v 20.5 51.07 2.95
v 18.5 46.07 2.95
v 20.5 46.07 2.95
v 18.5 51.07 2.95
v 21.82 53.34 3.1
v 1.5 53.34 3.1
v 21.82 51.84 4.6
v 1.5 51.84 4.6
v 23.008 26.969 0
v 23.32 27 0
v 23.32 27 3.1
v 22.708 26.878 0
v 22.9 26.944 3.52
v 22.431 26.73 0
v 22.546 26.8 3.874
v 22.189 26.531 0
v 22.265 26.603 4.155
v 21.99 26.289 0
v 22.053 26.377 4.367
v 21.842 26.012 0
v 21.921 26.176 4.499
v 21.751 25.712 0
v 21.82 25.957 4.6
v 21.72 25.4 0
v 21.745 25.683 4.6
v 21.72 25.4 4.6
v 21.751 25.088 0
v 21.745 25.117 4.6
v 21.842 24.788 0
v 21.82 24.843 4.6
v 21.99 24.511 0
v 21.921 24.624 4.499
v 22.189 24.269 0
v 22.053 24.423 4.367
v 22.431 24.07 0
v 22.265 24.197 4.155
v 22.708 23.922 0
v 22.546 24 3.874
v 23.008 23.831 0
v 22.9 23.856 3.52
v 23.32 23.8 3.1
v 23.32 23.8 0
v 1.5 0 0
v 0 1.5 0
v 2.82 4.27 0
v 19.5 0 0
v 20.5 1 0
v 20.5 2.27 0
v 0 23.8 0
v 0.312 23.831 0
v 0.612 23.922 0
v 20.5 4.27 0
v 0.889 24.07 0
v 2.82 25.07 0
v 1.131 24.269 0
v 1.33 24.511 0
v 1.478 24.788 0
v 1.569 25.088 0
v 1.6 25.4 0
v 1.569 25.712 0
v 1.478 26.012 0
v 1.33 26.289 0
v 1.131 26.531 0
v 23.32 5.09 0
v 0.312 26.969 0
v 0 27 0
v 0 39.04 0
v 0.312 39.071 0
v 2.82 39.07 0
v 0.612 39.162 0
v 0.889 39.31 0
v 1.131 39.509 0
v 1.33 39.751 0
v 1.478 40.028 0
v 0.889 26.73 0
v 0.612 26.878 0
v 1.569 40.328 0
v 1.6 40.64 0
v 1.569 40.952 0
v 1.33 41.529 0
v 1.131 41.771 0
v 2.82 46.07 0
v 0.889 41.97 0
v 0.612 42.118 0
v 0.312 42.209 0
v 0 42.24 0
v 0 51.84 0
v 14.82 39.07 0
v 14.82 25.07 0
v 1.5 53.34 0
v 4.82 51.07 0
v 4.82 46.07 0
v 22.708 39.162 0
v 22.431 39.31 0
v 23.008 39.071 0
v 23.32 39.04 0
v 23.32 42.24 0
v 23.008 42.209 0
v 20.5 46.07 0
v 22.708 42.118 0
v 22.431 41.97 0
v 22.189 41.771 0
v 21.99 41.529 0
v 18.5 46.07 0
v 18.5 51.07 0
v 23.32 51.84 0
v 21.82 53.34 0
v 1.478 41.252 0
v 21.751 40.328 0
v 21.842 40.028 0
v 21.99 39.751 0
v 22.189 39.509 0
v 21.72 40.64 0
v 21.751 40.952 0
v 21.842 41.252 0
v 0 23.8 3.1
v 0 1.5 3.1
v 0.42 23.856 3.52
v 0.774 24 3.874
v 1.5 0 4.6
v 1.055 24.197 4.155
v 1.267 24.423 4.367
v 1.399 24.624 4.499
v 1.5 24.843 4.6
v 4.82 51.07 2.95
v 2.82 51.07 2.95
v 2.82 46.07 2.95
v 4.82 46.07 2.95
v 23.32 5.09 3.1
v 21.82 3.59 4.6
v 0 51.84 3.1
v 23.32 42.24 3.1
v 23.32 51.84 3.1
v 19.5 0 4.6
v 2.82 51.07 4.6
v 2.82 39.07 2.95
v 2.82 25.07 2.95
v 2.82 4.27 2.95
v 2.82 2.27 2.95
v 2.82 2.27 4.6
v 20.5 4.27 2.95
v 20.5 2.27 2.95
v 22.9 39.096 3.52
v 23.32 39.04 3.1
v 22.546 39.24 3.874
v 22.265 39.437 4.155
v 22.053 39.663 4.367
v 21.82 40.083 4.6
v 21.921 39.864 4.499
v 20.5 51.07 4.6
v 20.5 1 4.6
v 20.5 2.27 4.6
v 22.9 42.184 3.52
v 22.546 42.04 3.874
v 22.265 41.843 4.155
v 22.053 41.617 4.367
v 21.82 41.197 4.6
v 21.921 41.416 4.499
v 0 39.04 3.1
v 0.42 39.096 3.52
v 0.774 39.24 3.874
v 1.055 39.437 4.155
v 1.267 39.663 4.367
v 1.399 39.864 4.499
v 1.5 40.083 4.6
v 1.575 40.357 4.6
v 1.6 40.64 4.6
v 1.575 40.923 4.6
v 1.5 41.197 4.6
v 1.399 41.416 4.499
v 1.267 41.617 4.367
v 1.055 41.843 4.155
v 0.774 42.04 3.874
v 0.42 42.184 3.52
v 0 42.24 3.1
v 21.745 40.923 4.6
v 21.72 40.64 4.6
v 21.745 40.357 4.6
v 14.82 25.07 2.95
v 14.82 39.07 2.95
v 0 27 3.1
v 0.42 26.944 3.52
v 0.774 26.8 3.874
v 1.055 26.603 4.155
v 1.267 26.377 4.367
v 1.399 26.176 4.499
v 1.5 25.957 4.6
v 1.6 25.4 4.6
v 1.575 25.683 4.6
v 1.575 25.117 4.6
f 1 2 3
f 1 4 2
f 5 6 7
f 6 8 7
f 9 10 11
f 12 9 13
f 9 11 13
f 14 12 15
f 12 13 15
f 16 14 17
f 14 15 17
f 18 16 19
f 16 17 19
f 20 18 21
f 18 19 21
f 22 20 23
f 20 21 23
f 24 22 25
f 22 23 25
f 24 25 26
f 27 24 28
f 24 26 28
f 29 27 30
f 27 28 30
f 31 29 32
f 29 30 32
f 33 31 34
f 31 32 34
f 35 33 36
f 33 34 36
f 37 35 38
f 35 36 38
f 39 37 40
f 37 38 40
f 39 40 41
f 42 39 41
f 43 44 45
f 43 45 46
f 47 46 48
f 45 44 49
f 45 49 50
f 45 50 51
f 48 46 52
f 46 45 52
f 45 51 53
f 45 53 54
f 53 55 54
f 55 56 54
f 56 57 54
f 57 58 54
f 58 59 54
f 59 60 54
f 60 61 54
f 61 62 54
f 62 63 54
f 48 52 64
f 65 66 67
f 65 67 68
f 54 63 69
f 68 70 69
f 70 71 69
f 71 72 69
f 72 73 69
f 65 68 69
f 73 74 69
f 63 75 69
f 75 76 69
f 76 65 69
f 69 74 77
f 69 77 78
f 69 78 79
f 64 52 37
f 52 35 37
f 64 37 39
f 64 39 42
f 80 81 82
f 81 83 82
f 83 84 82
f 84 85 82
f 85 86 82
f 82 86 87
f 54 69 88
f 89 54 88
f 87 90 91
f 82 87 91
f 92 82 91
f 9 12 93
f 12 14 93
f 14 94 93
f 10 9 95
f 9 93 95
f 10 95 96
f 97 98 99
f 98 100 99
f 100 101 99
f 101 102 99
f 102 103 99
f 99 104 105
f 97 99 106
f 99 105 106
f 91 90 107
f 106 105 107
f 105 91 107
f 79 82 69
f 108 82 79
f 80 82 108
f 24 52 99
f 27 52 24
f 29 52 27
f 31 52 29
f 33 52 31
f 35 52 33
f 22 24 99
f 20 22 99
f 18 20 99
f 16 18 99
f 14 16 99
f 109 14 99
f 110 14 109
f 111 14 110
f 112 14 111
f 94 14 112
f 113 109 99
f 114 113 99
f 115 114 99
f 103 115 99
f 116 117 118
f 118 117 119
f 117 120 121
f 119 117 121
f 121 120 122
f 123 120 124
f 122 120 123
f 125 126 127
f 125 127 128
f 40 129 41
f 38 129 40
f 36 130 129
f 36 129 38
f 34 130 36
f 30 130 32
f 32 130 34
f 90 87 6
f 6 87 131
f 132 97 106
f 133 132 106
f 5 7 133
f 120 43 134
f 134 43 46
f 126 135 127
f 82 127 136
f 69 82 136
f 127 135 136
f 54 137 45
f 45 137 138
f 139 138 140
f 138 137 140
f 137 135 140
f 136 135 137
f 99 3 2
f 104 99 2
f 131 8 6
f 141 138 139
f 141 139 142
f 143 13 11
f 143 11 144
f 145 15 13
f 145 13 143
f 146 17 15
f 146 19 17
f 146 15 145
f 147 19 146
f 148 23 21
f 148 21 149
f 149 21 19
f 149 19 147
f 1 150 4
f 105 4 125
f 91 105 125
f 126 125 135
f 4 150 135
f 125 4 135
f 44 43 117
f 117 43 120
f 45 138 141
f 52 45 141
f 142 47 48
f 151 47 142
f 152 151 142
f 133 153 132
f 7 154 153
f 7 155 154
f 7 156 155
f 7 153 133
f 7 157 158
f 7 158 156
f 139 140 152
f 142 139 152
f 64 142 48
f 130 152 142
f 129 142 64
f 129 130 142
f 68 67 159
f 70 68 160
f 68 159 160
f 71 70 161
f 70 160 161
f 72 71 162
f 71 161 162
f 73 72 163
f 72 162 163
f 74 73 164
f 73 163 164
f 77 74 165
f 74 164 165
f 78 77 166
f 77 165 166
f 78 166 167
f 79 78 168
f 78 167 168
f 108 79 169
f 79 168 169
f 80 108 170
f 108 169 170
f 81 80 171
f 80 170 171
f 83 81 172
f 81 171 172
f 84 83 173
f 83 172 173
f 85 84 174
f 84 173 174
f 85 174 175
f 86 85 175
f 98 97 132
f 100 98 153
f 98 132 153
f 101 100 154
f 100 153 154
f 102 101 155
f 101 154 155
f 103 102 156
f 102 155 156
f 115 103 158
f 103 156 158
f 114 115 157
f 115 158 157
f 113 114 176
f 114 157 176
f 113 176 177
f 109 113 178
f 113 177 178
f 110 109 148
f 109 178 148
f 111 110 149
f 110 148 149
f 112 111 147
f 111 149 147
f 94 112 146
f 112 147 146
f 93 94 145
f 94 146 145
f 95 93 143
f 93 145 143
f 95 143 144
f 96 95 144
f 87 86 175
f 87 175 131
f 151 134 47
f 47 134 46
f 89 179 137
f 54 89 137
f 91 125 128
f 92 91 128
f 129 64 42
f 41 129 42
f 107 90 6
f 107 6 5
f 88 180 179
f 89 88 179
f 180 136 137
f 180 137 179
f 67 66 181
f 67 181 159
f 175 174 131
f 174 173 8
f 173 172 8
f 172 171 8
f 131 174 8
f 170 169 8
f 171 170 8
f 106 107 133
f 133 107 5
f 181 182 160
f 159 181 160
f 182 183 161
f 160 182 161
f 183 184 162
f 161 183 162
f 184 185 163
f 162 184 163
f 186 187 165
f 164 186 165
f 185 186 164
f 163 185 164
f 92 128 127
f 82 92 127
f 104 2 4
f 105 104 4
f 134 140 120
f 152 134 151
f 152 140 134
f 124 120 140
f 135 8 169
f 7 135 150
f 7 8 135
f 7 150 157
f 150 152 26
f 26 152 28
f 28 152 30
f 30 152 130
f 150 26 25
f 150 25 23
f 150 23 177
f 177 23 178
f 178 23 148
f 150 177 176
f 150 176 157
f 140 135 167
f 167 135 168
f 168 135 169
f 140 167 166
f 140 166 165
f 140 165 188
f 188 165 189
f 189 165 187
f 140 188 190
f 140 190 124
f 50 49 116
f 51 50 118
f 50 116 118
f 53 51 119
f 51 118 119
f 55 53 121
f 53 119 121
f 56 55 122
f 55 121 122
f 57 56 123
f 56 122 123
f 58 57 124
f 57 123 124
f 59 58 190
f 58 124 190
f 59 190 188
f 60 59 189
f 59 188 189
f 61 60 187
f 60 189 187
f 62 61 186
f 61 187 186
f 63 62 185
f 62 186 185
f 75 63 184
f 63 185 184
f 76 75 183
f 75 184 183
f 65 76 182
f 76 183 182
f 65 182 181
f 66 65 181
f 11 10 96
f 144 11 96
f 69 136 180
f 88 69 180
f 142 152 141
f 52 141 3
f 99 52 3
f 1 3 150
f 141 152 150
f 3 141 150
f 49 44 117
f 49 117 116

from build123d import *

# Parameters (mm, degrees)
SKETCH_W        = 23.32
SKETCH_H        = 53.34
PAD_DEPTH       = 4.6
SKETCH001_W     = 17.68
SKETCH001_H     = 48.8
POCKET_DEPTH    = 1.65
POCKET001_DEPTH = 3
SKETCH003_R     = 1.6
POCKET002_DEPTH = 5
CHAMFER_SIZE    = 1.5
POCKET003_DEPTH = 5
CHAMFER001_SIZE = 1


with BuildPart() as part:
    # Sketch → Pad (new body)
    with BuildSketch(Plane.XY):
        with Locations((11.66, 26.67)):
            Rectangle(SKETCH_W, SKETCH_H)
    extrude(amount=PAD_DEPTH)

    # Sketch001 (on Face6 of Pad) → Pocket (cut)
    with BuildSketch(Plane.XY.offset(4.6)):
        with Locations((11.66, 26.67)):
            Rectangle(SKETCH001_W, SKETCH001_H)
    extrude(amount=-POCKET_DEPTH, mode=Mode.SUBTRACT)

    # Sketch002 (on Face11 of Pocket) → Pocket001 (cut)
    with BuildSketch(Plane.XY.offset(2.95)):
        Polygon((2.82, 4.27), (20.5, 4.27), (20.5, 46.07), (18.5, 46.07), (18.5, 51.07), (4.82, 51.07), (4.82, 46.07), (2.82, 46.07), (2.82, 39.07), (14.82, 39.07), (14.82, 25.07), (2.82, 25.07), align=None)
    extrude(amount=-POCKET001_DEPTH, mode=Mode.SUBTRACT)

    # Sketch003 (on Face5 of Pocket001) → Pocket002 (cut)
    with BuildSketch(Plane.XY.offset(4.6)):
        with Locations((23.32, 40.64)):
            Circle(SKETCH003_R)
        with Locations((23.32, 25.4)):
            Circle(SKETCH003_R)
        with Locations((0, 40.64)):
            Circle(SKETCH003_R)
        with Locations((0, 25.4)):
            Circle(SKETCH003_R)
    extrude(amount=-POCKET002_DEPTH, mode=Mode.SUBTRACT)

    # Chamfer
    chamfer_edges = [part.edges().sort_by_distance(p)[0] for p in [
        (23.32, 47.79, 4.6),
        (11.66, 53.34, 4.6),
        (0, 47.79, 4.6),
        (0, 33.02, 4.6),
        (23.32, 33.02, 4.6),
        (23.32, 11.9, 4.6),
        (0, 11.9, 4.6),
        (23.32, 0, 2.3),
        (0, 0, 2.3),
        (23.32, 53.34, 2.3),
        (0, 53.34, 2.3),
    ]]
    chamfer(chamfer_edges, length=CHAMFER_SIZE)

    # Sketch004 (on Face35 of Chamfer) → Pocket003 (cut)
    with BuildSketch(Plane.XY.offset(4.6)):
        Polygon((24.23, 6), (24.23, 0), (20.5, 0), (20.5, 2.27), align=None)
    extrude(amount=-POCKET003_DEPTH, mode=Mode.SUBTRACT)

    # Chamfer001
    chamfer001_edges = [part.edges().sort_by_distance(p)[0] for p in [
        (20.5, 0, 2.3),
    ]]
    chamfer(chamfer001_edges, length=CHAMFER001_SIZE)


solid = part.part
